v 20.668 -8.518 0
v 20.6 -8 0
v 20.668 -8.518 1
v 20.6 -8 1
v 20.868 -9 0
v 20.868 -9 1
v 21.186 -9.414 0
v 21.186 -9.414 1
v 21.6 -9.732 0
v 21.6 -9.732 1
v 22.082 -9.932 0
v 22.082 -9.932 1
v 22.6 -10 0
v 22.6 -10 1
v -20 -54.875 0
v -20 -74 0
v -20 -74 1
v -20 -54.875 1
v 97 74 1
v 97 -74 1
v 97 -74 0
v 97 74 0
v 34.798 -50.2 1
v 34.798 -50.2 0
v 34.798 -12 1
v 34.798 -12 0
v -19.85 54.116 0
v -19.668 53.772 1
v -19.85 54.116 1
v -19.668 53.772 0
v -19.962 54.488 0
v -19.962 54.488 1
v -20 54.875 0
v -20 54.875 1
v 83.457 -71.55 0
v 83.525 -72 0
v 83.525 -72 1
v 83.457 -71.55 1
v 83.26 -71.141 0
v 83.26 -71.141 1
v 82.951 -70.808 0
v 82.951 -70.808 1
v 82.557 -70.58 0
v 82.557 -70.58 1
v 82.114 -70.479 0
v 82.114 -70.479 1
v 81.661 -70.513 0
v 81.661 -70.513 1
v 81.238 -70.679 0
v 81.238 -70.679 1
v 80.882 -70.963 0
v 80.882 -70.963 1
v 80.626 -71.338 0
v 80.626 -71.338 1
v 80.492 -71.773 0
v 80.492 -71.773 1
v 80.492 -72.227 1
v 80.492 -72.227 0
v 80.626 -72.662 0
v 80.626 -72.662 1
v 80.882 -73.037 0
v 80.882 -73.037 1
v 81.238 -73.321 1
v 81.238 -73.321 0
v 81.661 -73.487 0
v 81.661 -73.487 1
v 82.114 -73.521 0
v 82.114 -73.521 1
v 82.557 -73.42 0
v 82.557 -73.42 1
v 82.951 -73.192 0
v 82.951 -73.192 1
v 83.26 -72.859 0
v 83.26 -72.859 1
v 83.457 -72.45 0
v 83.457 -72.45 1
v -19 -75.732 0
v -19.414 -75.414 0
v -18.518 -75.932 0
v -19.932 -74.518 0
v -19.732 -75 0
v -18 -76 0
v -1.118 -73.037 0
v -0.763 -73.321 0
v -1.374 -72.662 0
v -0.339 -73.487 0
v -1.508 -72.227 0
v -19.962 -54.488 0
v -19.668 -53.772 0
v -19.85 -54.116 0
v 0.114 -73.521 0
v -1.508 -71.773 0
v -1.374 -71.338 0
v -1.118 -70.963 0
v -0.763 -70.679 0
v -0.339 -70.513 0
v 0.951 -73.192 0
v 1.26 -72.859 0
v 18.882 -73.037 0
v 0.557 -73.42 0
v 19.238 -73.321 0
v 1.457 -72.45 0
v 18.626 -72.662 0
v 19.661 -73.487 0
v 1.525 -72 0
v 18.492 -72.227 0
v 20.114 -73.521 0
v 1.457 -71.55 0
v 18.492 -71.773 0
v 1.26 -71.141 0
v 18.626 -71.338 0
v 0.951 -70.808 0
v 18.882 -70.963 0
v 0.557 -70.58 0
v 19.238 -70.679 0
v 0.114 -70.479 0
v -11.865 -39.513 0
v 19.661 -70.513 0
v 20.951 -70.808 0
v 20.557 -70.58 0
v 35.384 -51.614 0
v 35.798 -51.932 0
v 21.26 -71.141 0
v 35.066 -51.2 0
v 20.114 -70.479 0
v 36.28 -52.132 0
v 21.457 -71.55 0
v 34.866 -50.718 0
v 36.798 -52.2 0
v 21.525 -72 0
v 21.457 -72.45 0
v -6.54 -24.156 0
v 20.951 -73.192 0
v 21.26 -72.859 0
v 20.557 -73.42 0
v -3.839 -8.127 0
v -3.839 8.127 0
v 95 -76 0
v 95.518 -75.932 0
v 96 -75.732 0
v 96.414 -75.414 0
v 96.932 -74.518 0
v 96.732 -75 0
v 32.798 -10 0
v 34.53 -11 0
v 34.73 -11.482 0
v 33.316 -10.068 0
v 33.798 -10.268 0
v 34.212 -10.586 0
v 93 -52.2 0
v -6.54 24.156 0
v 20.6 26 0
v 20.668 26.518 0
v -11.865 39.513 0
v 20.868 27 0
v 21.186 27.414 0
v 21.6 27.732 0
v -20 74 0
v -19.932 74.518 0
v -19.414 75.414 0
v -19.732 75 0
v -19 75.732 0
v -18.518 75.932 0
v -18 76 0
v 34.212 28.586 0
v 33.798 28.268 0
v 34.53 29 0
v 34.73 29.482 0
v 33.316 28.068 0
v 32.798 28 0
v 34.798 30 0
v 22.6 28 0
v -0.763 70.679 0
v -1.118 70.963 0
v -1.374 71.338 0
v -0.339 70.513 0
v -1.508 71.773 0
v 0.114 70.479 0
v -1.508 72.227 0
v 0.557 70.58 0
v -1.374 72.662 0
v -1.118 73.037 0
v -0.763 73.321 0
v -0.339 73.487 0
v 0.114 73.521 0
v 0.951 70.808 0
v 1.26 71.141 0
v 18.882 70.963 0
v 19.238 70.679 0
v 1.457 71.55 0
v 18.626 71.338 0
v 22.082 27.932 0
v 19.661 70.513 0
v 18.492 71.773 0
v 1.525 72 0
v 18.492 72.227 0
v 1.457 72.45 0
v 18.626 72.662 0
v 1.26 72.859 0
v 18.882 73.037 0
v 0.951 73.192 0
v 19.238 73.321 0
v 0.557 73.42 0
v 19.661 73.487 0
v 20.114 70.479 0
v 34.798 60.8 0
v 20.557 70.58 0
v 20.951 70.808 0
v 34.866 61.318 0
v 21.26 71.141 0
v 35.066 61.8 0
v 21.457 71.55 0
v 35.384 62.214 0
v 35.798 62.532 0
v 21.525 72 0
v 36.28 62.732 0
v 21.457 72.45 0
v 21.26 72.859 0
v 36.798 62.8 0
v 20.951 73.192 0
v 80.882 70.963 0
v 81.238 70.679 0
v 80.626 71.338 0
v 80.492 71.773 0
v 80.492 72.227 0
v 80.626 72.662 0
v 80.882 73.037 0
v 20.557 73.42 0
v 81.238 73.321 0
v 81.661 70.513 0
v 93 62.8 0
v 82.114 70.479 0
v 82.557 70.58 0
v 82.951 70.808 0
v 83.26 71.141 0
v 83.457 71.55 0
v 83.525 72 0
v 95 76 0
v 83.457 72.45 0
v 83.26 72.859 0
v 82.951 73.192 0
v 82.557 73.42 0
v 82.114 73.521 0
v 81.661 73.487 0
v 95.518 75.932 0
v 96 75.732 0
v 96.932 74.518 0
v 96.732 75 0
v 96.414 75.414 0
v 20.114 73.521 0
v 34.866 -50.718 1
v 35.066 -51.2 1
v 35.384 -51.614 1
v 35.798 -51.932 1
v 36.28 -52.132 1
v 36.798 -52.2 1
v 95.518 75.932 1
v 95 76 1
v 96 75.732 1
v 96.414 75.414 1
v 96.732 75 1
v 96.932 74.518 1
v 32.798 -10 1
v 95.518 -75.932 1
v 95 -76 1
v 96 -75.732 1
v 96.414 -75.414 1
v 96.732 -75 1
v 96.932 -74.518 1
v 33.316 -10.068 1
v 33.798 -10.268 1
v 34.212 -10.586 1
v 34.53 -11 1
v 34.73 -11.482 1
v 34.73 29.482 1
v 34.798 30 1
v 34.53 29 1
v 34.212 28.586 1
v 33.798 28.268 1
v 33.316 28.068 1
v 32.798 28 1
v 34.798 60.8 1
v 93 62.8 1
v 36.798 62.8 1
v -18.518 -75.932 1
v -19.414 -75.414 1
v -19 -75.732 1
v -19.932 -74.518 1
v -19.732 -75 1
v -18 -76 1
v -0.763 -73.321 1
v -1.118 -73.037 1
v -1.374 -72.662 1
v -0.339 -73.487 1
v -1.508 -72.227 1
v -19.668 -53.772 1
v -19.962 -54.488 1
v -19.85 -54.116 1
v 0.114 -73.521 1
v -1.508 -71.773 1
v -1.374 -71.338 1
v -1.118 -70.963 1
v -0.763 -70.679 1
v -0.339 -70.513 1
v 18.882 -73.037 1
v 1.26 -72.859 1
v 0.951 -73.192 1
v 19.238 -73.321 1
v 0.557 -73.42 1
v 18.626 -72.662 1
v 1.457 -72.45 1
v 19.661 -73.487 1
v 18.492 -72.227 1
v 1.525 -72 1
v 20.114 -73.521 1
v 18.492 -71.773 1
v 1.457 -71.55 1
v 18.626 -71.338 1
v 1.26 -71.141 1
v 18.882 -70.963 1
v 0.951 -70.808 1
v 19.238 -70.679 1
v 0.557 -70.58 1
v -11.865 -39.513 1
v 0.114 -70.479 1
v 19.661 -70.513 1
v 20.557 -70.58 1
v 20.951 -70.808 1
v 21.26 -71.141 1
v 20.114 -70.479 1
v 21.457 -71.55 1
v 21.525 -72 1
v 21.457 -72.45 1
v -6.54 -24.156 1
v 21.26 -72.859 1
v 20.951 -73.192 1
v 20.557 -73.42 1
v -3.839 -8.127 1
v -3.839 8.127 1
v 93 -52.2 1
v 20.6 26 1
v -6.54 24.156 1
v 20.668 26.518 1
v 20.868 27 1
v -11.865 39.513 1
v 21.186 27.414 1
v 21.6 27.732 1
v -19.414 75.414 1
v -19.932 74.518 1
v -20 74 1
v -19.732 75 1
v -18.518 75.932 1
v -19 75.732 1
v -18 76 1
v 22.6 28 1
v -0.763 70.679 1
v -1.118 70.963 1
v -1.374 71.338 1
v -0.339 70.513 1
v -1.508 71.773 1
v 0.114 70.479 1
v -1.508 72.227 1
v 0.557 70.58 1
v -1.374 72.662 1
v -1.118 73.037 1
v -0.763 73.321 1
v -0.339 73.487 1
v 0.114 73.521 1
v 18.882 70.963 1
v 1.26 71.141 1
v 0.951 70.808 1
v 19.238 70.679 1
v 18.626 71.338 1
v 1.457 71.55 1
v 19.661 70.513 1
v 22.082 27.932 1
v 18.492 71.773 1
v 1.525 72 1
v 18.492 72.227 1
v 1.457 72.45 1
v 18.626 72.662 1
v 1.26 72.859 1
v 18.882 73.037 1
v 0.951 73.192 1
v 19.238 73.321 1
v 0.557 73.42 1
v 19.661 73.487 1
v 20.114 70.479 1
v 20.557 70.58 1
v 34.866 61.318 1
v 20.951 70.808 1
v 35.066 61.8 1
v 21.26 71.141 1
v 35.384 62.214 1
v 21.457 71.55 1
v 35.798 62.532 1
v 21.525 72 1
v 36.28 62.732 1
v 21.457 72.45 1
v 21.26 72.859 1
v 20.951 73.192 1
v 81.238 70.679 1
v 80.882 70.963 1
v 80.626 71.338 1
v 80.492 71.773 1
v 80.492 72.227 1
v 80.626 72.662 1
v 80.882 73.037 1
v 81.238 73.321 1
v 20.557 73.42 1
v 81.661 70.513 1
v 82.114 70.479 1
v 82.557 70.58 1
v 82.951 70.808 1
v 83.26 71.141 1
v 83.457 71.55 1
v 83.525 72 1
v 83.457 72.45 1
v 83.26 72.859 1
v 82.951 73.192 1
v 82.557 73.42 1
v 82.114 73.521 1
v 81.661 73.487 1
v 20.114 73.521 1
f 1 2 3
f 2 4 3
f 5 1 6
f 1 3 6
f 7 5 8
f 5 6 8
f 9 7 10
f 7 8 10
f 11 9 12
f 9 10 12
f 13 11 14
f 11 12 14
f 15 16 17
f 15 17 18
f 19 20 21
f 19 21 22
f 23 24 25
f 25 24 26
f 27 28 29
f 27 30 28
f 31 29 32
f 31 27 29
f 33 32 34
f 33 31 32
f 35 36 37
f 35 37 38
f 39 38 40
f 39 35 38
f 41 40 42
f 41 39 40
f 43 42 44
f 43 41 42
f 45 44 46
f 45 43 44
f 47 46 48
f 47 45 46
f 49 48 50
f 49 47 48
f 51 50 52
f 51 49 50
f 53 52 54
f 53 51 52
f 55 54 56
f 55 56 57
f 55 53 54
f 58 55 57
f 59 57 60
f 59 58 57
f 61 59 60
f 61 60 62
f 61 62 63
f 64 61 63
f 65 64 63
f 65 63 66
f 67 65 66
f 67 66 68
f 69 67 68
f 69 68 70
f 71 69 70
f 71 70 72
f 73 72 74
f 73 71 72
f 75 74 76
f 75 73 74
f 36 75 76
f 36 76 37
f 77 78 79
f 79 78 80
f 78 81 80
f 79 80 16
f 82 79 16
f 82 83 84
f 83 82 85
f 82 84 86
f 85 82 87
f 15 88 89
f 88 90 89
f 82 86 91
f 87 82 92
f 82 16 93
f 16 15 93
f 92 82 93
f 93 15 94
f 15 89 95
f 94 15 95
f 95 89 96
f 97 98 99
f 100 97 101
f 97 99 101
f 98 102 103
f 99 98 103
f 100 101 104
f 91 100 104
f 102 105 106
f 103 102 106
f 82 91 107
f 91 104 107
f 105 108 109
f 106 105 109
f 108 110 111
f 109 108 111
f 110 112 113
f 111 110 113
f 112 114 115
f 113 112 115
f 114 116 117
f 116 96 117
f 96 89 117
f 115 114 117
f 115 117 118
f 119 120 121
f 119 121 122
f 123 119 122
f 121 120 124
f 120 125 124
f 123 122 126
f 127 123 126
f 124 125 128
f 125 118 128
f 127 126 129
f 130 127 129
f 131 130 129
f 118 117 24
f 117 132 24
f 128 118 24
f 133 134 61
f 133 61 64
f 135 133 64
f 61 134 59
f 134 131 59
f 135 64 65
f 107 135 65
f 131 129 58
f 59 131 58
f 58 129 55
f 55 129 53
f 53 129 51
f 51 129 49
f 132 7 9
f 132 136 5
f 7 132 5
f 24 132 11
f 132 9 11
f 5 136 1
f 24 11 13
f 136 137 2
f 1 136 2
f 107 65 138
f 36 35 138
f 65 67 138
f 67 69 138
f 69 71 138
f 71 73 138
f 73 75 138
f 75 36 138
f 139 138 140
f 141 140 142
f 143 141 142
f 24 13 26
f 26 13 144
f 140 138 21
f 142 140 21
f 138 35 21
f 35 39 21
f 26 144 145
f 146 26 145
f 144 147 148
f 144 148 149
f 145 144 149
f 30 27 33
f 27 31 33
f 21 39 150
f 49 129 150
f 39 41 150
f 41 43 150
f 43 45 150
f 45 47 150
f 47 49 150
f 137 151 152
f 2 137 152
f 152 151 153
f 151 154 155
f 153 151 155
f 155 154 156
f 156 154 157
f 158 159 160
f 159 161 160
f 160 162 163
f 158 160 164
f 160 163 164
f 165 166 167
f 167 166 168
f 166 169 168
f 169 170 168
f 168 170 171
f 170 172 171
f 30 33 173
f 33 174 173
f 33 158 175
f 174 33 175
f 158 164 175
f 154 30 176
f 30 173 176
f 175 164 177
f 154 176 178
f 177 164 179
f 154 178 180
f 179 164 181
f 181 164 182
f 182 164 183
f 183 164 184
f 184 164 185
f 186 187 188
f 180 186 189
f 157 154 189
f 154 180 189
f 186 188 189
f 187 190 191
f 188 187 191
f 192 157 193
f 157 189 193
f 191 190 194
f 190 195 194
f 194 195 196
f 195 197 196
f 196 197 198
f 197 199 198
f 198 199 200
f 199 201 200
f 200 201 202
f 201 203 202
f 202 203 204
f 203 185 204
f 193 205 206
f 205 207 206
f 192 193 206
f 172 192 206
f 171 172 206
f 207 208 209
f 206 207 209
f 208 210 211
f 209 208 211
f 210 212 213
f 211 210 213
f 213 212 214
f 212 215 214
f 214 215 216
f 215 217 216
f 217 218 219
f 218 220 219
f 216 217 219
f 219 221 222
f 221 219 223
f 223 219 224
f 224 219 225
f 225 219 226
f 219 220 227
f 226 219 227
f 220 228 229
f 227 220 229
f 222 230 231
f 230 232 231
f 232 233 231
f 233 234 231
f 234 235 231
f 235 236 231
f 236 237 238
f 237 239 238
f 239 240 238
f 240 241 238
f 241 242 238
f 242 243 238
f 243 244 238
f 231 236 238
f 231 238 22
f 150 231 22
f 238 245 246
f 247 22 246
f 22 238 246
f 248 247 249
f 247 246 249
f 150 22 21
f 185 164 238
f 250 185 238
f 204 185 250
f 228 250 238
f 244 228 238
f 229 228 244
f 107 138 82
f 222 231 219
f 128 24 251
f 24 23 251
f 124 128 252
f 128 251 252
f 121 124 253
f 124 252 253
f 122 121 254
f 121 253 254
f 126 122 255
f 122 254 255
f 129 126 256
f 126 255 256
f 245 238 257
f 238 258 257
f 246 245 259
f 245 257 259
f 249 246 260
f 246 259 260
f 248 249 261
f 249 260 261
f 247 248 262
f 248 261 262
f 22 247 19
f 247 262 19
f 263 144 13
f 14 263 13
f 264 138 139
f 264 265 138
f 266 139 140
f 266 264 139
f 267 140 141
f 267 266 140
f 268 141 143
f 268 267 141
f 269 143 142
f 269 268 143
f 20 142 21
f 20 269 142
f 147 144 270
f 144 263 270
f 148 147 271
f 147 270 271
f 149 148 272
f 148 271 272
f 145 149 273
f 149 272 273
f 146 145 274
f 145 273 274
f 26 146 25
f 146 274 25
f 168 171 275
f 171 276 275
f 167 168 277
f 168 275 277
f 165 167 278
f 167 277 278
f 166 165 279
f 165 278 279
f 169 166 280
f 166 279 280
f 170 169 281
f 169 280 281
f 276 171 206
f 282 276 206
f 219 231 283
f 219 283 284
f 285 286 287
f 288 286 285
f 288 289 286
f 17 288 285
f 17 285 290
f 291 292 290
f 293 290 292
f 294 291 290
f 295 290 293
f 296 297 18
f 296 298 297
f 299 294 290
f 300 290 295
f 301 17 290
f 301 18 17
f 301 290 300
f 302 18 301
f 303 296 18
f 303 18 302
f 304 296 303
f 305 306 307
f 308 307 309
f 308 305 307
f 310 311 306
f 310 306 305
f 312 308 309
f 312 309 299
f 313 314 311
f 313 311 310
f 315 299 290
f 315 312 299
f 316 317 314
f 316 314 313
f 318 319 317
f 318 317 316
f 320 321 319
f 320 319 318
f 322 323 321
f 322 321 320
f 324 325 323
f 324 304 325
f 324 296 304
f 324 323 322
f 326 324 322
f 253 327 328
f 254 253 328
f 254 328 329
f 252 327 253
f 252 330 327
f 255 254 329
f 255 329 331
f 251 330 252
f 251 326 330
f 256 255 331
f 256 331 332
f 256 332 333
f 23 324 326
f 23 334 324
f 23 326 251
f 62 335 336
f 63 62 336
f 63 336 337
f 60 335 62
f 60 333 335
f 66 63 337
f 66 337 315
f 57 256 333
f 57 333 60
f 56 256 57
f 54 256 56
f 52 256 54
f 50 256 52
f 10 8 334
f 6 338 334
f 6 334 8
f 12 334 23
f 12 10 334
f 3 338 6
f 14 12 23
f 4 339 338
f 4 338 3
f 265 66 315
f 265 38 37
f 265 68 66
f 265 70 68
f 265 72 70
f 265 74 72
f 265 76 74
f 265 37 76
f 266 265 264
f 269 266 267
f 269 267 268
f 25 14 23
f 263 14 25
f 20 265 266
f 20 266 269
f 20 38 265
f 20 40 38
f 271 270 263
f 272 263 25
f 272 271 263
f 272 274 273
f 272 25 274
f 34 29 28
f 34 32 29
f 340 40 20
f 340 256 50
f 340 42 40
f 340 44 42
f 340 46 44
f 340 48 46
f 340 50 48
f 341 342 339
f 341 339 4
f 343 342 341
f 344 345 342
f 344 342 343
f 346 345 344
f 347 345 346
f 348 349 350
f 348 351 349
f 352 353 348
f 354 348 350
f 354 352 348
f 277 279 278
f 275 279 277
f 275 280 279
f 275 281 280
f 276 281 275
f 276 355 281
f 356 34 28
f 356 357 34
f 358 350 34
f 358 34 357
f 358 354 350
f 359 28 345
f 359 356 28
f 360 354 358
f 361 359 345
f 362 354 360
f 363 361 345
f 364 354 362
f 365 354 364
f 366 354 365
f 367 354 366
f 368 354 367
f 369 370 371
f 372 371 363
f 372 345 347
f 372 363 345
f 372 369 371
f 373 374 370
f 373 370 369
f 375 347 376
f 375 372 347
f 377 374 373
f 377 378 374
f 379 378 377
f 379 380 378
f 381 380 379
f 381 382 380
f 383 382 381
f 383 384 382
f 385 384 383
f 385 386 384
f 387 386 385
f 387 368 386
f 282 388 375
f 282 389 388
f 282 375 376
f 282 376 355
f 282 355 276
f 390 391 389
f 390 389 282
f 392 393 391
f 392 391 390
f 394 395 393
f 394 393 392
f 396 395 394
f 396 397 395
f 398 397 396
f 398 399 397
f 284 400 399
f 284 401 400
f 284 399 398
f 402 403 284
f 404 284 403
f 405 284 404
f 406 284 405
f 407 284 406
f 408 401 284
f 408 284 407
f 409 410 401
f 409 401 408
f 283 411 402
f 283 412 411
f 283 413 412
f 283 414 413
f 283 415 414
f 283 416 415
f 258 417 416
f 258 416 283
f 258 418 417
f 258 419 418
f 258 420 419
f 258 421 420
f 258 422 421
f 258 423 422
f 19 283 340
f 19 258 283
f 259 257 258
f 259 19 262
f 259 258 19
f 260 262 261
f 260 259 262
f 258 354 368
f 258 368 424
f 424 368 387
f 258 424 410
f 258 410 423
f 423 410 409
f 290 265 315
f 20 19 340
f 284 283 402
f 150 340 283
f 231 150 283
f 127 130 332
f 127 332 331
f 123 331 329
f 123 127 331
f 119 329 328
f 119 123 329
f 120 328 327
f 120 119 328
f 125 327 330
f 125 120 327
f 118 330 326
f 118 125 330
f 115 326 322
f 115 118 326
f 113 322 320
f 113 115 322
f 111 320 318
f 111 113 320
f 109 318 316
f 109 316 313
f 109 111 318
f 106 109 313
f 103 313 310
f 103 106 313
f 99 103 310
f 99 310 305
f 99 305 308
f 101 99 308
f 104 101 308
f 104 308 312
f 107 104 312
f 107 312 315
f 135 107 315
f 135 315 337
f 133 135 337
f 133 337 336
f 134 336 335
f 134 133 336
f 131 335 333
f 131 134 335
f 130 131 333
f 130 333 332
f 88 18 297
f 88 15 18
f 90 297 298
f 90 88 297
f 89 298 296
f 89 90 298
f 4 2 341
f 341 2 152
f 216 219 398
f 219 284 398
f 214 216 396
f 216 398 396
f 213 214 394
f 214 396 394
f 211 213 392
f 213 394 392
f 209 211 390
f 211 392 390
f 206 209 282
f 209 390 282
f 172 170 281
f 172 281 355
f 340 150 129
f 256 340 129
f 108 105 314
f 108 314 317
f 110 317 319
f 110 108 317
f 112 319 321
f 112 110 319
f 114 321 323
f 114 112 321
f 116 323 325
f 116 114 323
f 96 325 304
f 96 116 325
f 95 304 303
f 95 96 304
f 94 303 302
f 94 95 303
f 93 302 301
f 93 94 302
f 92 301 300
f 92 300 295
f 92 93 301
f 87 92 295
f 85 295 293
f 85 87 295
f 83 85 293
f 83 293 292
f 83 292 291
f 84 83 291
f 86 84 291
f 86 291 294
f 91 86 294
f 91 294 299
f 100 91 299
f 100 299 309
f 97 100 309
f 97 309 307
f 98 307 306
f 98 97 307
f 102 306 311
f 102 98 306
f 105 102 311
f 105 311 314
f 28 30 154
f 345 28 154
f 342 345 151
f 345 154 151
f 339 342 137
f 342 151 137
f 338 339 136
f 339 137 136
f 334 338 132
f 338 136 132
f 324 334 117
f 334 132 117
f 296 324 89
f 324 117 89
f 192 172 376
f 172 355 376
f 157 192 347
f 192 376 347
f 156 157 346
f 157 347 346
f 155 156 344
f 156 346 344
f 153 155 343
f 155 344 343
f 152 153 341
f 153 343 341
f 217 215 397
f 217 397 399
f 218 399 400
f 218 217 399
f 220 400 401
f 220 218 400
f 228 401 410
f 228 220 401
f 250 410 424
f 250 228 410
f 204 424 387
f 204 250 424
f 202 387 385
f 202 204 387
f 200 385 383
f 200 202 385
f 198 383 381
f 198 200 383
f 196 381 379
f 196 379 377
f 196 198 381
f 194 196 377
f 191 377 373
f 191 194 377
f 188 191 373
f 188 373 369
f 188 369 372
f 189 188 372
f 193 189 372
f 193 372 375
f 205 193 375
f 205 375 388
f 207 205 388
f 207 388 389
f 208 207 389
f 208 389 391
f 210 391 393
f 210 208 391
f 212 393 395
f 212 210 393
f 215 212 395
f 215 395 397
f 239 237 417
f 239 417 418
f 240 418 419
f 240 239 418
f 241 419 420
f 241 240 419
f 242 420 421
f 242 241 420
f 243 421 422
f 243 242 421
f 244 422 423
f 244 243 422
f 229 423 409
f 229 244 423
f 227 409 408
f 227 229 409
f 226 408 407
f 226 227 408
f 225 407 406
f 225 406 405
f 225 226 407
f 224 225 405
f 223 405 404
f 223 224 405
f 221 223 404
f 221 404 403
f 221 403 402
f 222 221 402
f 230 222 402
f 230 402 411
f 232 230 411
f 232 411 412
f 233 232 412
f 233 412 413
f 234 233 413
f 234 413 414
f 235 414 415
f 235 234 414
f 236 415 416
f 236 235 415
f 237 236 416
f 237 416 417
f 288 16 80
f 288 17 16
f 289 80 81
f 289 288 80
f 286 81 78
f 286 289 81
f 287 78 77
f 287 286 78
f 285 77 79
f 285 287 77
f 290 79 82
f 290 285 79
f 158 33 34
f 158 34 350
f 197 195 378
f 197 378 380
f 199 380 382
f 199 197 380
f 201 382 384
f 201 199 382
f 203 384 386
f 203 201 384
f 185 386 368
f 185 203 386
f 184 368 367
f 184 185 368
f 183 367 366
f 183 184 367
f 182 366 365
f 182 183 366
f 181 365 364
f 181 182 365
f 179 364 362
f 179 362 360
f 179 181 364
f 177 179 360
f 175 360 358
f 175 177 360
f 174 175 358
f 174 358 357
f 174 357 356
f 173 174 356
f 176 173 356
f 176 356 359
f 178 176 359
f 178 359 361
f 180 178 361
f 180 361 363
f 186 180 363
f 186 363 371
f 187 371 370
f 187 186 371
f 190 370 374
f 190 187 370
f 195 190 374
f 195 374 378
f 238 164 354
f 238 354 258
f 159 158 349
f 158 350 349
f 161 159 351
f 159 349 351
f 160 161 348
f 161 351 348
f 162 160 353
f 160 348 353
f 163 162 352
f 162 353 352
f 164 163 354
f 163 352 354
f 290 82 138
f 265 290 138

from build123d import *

# Parameters (mm, degrees)
SKETCH_1_W          = 117
SKETCH_1_H          = 152
SKETCH_1_R          = 1.525
EXTRUDE_1_DEPTH     = 1
SKETCH_2_R          = 97.5
SKETCH_2_W          = 62.201961009
SKETCH_2_H          = 115
CUT_EXTRUDE_1_DEPTH = 10
SKETCH_3_W          = 20
SKETCH_3_H          = 37.999993186
CUT_EXTRUDE_2_DEPTH = 10
FILLET_1_R          = 2
SKETCH_6_W          = 4
SKETCH_6_H          = 115
EXTRUDE_2_DEPTH     = 1


with BuildPart() as part:
    # 草图1 → 凸台-拉伸1 (new body)
    with BuildSketch(Plane.XY):
        with Locations((38.5, 0)):
            Rectangle(SKETCH_1_W, SKETCH_1_H)
        with Locations((0, 72)):
            Circle(SKETCH_1_R, mode=Mode.SUBTRACT)
        with Locations((0, -72)):
            Circle(SKETCH_1_R, mode=Mode.SUBTRACT)
        with Locations((20, 72)):
            Circle(SKETCH_1_R, mode=Mode.SUBTRACT)
        with Locations((82, 72)):
            Circle(SKETCH_1_R, mode=Mode.SUBTRACT)
        with Locations((82, -72)):
            Circle(SKETCH_1_R, mode=Mode.SUBTRACT)
        with Locations((20, -72)):
            Circle(SKETCH_1_R, mode=Mode.SUBTRACT)
    extrude(amount=EXTRUDE_1_DEPTH)

    # 草图2 → 切除-拉伸1 (cut)
    with BuildSketch(Plane(origin=(0, 0, 0), x_dir=(-1, 0, 0), z_dir=(0, 0, -1))):
        with Locations((101, 0)):
            Circle(SKETCH_2_R)
        with Locations((-65.899019495, 5.300000572)):
            Rectangle(SKETCH_2_W, SKETCH_2_H)
    extrude(amount=-CUT_EXTRUDE_1_DEPTH, mode=Mode.SUBTRACT)

    # 草图3 → 切除-拉伸2 (cut)
    with BuildSketch(Plane(origin=(0, 0, 0), x_dir=(-1, 0, 0), z_dir=(0, 0, -1))):
        with Locations((-30.6, 8.999996593)):
            Rectangle(SKETCH_3_W, SKETCH_3_H)
    extrude(amount=-CUT_EXTRUDE_2_DEPTH, mode=Mode.SUBTRACT)

    # 圆角1
    fillet_1_edges = [part.edges().sort_by_distance(p)[0] for p in [
        (-20, 54.270157545, 0.5),
        (-20, -54.270157545, 0.5),
        (34.798038991, 62.800000572, 0.5),
        (34.798038991, -52.199999428, 0.5),
        (34.798038991, -10, 0.5),
        (34.798038991, 27.999993186, 0.5),
        (20.6, 27.999993186, 0.5),
        (20.6, -10, 0.5),
        (-20, 76, 0.5),
        (97, 76, 0.5),
        (97, -76, 0.5),
        (-20, -76, 0.5),
    ]]
    fillet(fillet_1_edges, radius=FILLET_1_R)

    # 草图6 → 凸台-拉伸2 (add)
    with BuildSketch(Plane.XY.offset(1)):
        with Locations((95, 5.300000572)):
            Rectangle(SKETCH_6_W, SKETCH_6_H)
    extrude(amount=-EXTRUDE_2_DEPTH)


solid = part.part
